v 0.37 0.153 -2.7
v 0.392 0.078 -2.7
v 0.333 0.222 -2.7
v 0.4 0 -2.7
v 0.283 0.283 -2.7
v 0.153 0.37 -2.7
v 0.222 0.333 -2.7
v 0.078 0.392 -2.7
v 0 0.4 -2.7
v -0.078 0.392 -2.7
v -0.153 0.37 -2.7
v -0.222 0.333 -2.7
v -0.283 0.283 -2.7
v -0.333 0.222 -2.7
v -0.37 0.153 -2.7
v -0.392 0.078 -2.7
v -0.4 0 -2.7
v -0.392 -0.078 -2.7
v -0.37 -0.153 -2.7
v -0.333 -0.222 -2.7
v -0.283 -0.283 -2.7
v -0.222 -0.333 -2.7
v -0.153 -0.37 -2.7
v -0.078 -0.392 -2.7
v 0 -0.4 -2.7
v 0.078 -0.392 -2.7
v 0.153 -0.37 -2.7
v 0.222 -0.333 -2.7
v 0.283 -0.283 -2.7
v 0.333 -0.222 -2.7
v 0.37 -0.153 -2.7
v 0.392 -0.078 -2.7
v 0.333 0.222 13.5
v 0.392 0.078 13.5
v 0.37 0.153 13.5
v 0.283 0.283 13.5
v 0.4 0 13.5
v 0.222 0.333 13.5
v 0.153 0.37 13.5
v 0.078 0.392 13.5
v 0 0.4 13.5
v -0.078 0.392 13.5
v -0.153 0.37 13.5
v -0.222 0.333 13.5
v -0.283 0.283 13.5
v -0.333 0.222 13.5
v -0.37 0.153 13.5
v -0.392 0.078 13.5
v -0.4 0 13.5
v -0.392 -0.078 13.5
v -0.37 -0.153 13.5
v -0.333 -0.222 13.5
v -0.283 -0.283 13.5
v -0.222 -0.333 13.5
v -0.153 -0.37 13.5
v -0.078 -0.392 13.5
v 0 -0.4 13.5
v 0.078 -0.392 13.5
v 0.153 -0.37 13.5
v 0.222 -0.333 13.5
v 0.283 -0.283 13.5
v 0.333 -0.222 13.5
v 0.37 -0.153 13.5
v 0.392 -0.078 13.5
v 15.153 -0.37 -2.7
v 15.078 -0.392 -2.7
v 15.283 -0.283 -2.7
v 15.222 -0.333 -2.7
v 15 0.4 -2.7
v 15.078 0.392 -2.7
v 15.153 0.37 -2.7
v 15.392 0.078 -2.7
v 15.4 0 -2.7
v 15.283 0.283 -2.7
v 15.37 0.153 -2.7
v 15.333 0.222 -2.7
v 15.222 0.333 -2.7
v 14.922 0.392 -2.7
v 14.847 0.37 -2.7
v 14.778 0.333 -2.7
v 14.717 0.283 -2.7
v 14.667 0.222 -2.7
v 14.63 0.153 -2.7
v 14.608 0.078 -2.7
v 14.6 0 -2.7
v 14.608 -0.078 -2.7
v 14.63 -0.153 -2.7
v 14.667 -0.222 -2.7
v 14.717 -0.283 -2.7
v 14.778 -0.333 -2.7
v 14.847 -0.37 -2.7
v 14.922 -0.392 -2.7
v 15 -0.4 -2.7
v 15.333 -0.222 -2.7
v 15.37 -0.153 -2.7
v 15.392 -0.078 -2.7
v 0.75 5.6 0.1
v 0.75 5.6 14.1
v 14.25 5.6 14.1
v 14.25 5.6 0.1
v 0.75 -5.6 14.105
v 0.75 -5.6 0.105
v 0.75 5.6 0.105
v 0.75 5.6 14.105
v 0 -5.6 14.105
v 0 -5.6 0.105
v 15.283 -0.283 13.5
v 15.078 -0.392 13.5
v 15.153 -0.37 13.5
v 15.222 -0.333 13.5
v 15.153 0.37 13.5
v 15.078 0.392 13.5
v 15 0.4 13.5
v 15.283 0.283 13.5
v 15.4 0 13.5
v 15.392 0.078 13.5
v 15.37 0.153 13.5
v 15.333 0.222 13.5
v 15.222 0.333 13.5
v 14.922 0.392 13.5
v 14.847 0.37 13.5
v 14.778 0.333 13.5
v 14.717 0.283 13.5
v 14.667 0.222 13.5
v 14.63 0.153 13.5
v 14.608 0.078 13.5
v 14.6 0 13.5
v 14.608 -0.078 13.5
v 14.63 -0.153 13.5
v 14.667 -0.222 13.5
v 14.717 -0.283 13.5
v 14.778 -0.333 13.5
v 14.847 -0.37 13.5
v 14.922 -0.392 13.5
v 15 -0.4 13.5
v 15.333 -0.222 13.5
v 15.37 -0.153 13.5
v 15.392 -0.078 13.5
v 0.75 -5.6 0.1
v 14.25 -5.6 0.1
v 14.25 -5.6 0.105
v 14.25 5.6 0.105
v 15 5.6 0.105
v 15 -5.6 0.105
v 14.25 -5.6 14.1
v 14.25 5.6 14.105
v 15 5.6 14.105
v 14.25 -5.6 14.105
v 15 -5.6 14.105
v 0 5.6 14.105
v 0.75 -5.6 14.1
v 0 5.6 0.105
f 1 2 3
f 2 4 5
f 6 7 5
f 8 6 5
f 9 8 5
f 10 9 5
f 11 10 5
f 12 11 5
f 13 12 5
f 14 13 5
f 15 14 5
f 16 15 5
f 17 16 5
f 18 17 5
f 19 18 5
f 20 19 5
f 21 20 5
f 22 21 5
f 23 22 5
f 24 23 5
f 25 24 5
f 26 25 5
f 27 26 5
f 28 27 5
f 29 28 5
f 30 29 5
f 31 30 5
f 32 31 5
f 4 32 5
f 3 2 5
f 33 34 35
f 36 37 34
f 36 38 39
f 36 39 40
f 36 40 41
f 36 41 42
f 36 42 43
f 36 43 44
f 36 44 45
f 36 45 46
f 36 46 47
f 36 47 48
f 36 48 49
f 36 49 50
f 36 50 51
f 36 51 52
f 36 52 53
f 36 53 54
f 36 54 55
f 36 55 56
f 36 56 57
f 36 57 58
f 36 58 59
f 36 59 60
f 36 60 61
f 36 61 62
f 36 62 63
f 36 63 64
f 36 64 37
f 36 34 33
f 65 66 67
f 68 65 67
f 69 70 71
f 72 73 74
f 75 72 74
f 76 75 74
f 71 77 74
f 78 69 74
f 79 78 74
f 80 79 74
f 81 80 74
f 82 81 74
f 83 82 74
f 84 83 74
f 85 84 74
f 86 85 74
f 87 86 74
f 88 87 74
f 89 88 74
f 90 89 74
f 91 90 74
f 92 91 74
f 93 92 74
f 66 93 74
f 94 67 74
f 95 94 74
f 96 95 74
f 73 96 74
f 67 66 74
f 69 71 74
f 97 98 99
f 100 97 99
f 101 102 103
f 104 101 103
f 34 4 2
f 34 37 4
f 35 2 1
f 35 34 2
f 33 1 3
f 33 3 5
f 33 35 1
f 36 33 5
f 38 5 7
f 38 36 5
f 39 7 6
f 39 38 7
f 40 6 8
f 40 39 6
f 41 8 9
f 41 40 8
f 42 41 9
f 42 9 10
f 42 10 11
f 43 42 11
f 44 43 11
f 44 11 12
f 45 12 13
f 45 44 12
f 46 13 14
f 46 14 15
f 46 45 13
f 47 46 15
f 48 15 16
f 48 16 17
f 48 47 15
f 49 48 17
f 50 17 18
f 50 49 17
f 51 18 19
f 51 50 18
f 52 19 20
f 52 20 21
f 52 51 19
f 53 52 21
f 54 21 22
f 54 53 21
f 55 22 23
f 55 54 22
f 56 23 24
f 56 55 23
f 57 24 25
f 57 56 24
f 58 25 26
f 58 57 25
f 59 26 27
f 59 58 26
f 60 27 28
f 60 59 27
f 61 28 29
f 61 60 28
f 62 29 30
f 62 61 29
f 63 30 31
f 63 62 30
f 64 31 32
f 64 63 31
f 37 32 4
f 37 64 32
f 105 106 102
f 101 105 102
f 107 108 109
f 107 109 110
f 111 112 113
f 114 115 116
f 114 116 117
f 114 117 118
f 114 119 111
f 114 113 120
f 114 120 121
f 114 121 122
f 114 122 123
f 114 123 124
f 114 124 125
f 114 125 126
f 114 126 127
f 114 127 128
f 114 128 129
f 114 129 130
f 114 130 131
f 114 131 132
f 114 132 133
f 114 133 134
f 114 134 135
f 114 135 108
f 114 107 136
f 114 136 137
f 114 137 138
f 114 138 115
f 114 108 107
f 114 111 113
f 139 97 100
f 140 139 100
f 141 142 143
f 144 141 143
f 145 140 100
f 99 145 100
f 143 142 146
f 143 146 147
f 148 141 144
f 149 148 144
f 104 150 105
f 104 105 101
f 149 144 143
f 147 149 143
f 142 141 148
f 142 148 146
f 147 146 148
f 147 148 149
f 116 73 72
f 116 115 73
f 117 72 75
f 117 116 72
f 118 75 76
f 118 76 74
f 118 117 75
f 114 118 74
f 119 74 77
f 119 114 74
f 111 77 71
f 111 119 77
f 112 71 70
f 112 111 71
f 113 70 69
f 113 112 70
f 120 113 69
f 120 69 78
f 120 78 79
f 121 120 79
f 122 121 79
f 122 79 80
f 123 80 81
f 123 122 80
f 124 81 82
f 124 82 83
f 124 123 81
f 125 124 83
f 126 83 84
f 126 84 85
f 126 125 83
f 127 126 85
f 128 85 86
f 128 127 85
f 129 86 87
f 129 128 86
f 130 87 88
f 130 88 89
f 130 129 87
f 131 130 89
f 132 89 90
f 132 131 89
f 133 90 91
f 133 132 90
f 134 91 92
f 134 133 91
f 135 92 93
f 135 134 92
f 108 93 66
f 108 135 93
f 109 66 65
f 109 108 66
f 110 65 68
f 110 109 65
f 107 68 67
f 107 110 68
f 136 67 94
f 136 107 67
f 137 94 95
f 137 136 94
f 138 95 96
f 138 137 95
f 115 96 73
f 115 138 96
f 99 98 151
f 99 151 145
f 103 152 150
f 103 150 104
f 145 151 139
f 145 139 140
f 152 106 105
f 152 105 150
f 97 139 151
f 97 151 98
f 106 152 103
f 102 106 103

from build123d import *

# Parameters (mm, degrees)
SKETCH_W          = 13.5
SKETCH_H          = 11.2
PAD_DEPTH         = 14
SKETCH001_R       = 0.4
PAD001_DEPTH      = 13
PAD001_DEPTH_BACK = 3.2
SKETCH002_W       = 0.75
SKETCH002_H       = 11.2
PAD002_DEPTH      = 14


with BuildPart() as pad:
    # Sketch → Pad (new body)
    with BuildSketch(Plane.XY.offset(0.1)):
        with Locations((7.5, 0)):
            Rectangle(SKETCH_W, SKETCH_H)
    extrude(amount=PAD_DEPTH)


with BuildPart() as pad001:
    # Sketch001 → Pad001 (new body, two sides)
    with BuildSketch(Plane.XY.offset(0.5)) as pad001_sk:
        Circle(SKETCH001_R)
        with Locations((15, 0)):
            Circle(SKETCH001_R)
    extrude(amount=PAD001_DEPTH)
    extrude(pad001_sk.sketch, amount=-PAD001_DEPTH_BACK)


with BuildPart() as pad002:
    # Sketch002 → Pad002 (new body)
    with BuildSketch(Plane.XY.offset(0.105)):
        with Locations((0.375, 0)):
            Rectangle(SKETCH002_W, SKETCH002_H)
        with Locations((14.625, 0)):
            Rectangle(SKETCH002_W, SKETCH002_H)
    extrude(amount=PAD002_DEPTH)


solid = Compound([pad.part, pad001.part, pad002.part])
